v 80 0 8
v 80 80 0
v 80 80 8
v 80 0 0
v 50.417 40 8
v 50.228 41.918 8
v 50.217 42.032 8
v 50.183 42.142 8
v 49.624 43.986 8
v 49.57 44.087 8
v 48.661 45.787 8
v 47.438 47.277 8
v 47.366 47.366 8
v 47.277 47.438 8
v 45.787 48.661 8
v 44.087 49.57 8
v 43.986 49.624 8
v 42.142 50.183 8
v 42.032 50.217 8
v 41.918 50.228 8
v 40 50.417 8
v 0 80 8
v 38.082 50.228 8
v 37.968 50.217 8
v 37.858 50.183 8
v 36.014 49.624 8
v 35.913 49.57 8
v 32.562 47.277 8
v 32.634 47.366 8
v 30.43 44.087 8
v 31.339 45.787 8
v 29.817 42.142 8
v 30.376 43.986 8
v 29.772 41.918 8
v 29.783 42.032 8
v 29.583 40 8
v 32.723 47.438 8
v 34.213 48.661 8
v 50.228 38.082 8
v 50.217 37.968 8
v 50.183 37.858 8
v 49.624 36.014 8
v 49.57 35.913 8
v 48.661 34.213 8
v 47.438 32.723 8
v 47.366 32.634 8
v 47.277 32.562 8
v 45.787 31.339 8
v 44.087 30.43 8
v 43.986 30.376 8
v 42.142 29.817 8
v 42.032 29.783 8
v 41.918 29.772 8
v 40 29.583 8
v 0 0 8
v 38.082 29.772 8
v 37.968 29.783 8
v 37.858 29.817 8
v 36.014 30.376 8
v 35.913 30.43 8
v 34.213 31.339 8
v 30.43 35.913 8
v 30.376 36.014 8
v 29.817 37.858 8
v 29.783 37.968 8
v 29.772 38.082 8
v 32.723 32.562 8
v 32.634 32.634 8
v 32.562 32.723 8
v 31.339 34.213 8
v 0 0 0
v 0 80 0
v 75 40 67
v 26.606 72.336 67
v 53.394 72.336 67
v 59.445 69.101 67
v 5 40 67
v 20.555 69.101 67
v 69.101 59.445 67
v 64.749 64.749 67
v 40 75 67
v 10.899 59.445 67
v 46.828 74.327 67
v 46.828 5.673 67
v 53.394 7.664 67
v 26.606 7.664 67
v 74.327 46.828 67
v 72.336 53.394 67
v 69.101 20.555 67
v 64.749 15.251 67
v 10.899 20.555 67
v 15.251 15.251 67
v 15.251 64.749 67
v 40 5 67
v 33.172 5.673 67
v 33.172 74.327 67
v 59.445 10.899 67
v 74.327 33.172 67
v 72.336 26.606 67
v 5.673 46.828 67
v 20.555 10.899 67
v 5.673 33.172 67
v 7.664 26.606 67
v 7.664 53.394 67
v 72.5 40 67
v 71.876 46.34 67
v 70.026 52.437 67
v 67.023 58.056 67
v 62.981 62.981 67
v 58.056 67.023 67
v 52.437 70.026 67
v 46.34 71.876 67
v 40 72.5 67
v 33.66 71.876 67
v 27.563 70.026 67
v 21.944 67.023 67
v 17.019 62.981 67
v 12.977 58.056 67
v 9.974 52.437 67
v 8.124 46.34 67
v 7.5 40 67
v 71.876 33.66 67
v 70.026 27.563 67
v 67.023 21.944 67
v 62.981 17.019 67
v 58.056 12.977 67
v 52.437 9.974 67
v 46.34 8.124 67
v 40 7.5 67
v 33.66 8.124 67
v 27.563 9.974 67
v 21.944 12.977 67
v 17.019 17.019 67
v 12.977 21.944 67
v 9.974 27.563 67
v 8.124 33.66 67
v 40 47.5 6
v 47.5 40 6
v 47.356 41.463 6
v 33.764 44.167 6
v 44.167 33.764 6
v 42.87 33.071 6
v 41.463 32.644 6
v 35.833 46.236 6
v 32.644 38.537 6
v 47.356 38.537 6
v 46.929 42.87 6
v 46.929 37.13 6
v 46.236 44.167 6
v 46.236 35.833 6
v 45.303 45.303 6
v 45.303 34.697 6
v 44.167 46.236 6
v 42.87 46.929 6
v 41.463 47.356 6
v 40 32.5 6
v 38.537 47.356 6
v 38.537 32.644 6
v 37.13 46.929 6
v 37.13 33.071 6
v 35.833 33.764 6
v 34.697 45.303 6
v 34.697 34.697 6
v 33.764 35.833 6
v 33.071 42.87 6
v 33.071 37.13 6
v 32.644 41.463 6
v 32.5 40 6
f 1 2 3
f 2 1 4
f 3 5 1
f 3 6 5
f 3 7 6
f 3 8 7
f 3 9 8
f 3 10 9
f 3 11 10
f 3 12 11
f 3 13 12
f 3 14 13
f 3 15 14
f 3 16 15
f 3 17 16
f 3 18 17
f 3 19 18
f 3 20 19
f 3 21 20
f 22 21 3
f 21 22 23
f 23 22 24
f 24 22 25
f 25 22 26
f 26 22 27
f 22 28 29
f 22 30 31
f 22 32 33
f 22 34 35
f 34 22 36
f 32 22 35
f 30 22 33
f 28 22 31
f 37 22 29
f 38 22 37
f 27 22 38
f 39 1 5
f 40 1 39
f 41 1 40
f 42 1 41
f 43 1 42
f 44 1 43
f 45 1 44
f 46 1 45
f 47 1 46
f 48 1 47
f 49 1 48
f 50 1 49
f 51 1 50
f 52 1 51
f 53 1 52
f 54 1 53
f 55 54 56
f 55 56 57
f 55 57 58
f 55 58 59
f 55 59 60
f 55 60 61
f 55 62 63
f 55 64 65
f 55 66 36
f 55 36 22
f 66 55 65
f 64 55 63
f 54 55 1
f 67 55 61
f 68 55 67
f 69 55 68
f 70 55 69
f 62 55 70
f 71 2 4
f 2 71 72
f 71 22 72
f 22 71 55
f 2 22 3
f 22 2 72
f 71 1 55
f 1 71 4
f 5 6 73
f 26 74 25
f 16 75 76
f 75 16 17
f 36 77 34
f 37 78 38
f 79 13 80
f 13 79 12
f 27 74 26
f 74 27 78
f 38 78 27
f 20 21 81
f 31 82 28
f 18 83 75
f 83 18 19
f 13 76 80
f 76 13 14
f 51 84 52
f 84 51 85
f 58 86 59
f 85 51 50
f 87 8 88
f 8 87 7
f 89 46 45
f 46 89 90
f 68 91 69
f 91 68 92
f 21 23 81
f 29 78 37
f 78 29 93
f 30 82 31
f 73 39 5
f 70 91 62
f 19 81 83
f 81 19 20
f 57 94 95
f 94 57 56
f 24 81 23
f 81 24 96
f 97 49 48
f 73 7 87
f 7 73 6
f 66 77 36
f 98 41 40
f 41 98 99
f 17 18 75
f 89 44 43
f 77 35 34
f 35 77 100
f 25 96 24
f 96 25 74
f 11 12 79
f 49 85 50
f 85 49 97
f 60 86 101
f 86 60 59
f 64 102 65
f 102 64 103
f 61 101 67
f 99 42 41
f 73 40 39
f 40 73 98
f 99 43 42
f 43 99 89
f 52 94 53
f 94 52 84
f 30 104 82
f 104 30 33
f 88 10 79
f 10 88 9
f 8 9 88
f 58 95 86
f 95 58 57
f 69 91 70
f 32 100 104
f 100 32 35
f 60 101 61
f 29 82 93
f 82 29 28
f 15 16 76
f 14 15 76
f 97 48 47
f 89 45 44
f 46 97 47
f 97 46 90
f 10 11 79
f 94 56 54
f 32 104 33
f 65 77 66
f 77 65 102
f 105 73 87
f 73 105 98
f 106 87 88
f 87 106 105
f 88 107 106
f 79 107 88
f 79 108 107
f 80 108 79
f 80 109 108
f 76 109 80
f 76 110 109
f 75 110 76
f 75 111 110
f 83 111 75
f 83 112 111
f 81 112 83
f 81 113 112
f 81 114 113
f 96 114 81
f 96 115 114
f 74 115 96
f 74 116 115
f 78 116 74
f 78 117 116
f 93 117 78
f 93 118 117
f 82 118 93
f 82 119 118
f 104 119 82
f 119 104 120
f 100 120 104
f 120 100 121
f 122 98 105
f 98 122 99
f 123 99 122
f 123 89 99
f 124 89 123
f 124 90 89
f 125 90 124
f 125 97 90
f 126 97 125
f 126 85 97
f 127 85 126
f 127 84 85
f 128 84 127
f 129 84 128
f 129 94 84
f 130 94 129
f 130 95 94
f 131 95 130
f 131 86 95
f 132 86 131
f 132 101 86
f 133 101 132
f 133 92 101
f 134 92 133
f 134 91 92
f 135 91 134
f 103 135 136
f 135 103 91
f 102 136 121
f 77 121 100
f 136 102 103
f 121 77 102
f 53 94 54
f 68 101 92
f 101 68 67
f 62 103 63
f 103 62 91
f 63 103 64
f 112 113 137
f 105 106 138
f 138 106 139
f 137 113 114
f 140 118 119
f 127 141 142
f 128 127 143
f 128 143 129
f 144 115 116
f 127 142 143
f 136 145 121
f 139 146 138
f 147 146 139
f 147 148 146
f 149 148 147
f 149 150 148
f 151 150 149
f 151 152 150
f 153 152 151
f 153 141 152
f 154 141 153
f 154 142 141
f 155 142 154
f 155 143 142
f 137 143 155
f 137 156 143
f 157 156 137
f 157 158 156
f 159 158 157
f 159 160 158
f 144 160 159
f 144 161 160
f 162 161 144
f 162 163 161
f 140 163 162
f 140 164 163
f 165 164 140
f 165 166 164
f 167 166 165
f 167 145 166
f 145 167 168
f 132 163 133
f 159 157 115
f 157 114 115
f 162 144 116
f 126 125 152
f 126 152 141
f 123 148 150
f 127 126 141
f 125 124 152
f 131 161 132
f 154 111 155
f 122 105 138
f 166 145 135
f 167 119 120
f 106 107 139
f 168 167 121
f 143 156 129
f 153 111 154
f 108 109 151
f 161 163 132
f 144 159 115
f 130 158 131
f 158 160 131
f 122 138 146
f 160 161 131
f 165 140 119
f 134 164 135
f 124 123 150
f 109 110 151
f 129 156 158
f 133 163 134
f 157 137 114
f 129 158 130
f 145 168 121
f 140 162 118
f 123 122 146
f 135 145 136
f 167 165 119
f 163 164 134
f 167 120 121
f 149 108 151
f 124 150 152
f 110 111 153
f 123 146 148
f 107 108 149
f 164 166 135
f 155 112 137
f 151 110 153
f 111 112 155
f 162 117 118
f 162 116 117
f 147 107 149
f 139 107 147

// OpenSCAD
$fn = 32;

// ----------------------------------------------------------------------
// Hopper: funnel with square flange
// ----------------------------------------------------------------------

// --- parameters (mm) ---
fl = 80;                  // flange side, X and Y
fl_t = 8;                 // flange thickness
cone_h = 60;              // cone height above the flange
top_d = 70;               // cone mouth diameter
bot_d = 20;               // cone spout diameter
wall = 2.5;               // cone wall thickness

bore_d = bot_d - 2 * wall;  // spout bore diameter
total_h = fl_t + cone_h - 1;  // overall height

difference() {
  union() {
    cube([fl, fl, fl_t]);
    translate([fl / 2, fl / 2, fl_t - 1])
      cylinder(h = cone_h, d1 = bot_d, d2 = top_d);
  }
  translate([fl / 2, fl / 2, fl_t - 2])
    cylinder(h = cone_h + 1, d1 = bore_d, d2 = top_d - 2 * wall);
}
